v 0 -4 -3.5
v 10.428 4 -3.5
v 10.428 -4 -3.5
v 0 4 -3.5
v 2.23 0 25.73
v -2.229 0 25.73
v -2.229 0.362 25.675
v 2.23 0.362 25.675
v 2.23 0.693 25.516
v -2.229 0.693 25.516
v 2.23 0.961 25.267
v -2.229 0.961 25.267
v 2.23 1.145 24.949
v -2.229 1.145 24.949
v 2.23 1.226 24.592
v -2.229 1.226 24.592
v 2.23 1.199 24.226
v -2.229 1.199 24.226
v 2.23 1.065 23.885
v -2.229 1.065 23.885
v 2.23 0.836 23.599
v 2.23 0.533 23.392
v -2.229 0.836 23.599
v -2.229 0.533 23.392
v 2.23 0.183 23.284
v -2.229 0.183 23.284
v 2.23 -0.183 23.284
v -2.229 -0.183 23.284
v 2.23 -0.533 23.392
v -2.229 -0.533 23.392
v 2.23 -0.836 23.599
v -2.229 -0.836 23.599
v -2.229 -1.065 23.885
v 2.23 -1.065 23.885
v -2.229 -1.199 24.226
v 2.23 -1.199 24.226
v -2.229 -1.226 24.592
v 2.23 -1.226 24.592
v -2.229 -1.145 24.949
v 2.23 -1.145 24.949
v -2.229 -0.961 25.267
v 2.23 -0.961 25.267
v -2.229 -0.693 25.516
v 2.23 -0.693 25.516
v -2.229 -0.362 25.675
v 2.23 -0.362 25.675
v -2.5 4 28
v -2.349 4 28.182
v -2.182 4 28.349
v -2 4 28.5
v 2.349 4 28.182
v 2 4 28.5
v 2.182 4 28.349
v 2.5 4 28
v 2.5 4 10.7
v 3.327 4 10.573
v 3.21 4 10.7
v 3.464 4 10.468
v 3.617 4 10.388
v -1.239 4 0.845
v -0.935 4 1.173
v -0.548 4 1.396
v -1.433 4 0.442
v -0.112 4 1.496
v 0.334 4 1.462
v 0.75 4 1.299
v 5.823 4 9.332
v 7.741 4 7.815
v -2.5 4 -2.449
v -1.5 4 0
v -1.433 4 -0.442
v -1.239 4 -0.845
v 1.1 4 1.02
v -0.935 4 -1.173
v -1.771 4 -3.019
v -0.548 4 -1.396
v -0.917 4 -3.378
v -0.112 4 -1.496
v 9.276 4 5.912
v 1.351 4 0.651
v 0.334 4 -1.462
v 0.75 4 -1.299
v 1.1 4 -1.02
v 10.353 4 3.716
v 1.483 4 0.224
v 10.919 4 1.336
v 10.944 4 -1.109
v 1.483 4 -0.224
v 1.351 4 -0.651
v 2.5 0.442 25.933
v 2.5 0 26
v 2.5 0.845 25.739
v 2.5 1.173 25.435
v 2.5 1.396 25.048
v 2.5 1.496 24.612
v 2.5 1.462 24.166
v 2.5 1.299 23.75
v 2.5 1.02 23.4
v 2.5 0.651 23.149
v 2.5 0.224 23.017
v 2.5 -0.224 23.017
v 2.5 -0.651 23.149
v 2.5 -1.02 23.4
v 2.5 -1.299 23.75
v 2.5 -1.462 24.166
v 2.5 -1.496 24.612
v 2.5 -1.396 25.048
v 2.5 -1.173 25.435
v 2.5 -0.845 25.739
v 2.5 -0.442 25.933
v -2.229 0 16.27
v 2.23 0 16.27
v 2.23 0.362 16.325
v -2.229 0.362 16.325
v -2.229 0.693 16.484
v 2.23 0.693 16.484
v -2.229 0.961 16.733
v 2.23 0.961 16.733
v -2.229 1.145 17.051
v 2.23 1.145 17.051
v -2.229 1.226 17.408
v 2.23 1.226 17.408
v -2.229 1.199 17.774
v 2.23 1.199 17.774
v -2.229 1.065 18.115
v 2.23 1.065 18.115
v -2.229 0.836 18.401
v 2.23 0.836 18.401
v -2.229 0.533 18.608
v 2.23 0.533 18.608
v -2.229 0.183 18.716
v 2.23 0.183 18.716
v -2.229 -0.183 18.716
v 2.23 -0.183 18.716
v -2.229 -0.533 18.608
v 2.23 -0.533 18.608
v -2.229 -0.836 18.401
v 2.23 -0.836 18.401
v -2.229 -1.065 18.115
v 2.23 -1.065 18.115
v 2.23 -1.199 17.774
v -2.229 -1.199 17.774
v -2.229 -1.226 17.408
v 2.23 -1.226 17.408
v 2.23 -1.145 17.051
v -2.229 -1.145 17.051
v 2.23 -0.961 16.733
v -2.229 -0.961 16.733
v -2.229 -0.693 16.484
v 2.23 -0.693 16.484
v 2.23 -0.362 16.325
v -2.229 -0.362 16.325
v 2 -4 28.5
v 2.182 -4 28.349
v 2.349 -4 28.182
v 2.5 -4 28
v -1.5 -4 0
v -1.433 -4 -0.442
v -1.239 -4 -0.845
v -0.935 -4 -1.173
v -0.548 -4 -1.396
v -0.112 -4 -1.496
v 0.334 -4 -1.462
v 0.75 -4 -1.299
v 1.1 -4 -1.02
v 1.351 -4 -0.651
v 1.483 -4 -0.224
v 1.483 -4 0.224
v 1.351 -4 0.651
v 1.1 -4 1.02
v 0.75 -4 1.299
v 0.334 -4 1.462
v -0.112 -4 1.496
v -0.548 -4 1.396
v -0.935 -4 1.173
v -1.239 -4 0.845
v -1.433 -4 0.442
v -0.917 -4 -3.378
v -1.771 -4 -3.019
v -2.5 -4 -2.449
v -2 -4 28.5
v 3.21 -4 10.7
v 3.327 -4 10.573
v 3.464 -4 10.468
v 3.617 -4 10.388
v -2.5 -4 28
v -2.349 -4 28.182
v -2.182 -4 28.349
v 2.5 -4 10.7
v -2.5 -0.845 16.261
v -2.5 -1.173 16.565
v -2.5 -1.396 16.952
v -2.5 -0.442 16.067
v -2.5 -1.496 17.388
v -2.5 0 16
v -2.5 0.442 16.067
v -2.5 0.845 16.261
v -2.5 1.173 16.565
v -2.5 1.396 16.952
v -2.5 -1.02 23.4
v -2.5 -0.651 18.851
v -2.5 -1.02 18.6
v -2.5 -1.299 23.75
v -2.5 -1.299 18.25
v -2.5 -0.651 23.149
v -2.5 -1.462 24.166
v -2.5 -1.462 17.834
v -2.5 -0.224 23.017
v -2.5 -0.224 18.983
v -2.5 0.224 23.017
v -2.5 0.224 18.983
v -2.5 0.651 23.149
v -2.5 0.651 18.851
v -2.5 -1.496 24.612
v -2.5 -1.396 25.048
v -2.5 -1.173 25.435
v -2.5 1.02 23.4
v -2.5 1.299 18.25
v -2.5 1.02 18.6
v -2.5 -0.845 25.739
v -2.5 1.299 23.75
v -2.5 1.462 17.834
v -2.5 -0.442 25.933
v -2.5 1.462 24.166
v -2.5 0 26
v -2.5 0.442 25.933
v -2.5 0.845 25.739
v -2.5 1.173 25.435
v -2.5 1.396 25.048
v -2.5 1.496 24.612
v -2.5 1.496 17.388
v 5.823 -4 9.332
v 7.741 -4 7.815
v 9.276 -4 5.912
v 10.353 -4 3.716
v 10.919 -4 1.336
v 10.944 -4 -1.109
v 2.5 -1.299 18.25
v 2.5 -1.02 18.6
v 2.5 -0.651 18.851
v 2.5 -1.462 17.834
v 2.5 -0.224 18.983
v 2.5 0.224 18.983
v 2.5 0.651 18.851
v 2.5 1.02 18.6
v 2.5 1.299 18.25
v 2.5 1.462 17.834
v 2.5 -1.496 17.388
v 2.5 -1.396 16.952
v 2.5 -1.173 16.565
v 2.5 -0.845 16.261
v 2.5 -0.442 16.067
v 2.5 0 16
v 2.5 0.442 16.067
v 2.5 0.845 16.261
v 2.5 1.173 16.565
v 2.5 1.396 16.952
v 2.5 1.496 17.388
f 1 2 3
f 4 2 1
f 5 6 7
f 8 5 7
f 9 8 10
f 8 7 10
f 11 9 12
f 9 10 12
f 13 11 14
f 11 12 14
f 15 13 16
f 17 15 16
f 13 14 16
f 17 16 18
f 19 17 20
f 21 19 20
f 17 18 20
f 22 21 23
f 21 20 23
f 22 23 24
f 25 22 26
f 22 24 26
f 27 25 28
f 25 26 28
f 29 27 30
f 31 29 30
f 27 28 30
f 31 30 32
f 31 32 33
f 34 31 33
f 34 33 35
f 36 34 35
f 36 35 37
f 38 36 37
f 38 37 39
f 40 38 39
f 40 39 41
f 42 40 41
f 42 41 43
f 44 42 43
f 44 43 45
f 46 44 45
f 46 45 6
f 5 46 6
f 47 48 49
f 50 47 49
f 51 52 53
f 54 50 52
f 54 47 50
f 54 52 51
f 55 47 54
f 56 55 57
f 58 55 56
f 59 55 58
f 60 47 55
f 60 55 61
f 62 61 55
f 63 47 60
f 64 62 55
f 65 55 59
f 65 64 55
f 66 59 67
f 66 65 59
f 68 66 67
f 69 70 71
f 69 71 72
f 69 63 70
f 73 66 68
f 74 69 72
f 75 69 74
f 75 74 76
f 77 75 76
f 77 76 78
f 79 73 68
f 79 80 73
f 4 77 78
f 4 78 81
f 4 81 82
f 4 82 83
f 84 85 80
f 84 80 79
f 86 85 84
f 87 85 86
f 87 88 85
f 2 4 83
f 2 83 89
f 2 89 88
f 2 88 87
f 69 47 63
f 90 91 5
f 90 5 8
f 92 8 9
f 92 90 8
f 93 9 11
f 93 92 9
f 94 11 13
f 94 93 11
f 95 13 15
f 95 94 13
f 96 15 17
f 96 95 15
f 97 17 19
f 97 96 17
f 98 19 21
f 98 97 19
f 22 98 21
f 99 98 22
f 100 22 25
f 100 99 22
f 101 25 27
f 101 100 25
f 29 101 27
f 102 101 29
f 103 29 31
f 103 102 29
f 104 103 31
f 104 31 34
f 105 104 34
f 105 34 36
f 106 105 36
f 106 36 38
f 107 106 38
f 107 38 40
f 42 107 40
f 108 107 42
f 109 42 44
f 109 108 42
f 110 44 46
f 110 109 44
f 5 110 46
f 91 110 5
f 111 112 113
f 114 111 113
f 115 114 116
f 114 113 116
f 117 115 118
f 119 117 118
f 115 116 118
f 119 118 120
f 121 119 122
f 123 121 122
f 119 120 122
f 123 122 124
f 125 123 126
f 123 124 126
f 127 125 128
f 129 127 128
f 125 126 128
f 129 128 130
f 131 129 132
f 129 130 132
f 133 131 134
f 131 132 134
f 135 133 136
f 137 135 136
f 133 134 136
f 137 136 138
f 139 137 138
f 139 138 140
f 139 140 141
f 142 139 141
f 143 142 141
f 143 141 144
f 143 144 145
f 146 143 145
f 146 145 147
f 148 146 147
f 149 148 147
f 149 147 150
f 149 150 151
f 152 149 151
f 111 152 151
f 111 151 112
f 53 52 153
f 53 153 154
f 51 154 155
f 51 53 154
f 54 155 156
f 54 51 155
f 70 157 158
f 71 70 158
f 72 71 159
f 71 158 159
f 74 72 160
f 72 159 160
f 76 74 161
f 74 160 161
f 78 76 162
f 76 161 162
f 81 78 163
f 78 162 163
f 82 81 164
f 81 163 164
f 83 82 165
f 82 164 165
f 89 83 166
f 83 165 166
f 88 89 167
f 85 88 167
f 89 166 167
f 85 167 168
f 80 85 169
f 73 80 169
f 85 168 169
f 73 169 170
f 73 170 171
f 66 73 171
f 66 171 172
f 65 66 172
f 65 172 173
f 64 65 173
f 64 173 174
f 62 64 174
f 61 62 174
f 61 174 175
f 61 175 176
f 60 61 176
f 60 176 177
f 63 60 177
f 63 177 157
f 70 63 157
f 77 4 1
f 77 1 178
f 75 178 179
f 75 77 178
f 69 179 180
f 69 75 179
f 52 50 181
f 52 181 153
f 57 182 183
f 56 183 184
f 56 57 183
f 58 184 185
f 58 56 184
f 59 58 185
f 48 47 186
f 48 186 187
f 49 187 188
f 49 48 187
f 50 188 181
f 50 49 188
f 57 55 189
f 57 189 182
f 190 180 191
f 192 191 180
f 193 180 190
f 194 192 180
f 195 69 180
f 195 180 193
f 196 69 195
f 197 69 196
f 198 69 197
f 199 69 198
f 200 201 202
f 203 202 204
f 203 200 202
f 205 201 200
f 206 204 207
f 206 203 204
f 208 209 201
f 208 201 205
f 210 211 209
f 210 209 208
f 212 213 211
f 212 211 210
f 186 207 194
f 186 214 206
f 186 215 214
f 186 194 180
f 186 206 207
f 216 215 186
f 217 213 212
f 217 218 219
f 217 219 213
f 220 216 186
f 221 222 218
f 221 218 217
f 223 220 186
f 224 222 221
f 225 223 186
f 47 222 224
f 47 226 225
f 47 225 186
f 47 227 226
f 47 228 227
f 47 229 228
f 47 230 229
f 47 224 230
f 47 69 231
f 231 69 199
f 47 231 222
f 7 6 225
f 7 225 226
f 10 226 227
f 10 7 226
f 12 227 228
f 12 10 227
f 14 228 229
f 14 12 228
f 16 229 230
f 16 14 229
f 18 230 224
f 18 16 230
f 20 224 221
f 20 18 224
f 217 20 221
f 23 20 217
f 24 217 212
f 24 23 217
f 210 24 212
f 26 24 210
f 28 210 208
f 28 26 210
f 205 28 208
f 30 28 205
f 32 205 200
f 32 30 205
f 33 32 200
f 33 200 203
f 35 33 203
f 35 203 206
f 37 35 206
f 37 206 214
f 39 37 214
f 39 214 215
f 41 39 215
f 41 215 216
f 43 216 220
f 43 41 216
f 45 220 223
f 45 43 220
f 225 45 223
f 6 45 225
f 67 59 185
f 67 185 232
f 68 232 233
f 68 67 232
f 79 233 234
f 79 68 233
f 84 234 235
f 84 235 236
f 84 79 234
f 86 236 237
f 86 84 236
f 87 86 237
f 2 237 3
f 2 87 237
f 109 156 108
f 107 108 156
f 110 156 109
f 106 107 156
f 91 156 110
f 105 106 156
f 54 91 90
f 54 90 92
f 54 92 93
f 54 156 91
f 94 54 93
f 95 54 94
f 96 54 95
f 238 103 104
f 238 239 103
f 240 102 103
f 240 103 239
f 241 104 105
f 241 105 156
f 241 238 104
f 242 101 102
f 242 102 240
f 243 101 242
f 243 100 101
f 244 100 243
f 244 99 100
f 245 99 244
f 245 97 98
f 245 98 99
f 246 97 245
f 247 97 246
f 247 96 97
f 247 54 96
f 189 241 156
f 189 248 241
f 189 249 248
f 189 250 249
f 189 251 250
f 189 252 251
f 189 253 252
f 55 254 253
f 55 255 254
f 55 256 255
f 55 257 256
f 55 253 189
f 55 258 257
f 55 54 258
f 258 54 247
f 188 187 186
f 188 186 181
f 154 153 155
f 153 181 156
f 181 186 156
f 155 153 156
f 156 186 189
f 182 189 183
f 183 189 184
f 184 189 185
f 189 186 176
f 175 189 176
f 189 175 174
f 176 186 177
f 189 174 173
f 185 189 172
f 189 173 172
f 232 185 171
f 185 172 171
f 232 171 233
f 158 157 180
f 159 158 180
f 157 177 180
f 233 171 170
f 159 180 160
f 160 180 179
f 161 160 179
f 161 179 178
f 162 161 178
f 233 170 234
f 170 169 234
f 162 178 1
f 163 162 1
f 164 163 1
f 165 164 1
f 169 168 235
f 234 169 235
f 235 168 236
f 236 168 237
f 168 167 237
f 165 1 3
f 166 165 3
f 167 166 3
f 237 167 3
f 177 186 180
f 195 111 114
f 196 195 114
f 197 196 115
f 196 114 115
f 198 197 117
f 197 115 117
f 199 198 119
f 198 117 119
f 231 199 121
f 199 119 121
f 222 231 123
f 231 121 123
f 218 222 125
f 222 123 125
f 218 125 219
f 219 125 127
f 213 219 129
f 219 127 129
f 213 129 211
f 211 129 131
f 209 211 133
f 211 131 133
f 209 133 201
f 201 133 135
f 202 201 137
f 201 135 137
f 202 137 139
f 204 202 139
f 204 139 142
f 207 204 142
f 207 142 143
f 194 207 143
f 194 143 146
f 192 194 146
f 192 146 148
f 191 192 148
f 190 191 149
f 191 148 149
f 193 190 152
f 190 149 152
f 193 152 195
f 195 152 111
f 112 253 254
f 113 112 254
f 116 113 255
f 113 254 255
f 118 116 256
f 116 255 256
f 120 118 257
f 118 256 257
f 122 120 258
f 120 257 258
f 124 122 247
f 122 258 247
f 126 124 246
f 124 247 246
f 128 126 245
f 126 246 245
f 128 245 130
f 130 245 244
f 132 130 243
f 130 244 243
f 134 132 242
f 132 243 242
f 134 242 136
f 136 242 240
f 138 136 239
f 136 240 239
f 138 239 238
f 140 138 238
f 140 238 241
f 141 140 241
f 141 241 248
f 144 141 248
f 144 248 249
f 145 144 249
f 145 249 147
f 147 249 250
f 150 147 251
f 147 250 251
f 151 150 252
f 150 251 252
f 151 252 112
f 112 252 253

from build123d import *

# Parameters (mm, degrees)
EXTRUDE_1_DEPTH        = 8
HOLE_WIZARD_M2_1_D     = 2.459
HOLE_WIZARD_M2_1_DEPTH = 13.499999938
HOLE_WIZARD_M2_2_D     = 2.459
HOLE_WIZARD_3_0_3_1_D  = 3
CHAMFER_1_SIZE         = 0.2705


with BuildPart() as part:
    # 草图1 → 凸台-拉伸1 (new body)
    with BuildSketch(Plane(origin=(0, 4, 0), x_dir=(1, 0, 0), z_dir=(0, 1, 0))):
        with BuildLine():
            Line((-2.499999938, 2.449489682), (-2.499999938, -28.00000006))
            ThreePointArc((-2.499999938, -28.00000006), (-2.267766887, -28.267767018), (-1.999999928, -28.500000068))
            Line((-1.999999928, -28.500000068), (2.000000062, -28.500000068))
            ThreePointArc((2.000000062, -28.500000068), (2.267767019, -28.267767016), (2.500000069, -28.000000058))
            Line((2.500000069, -28.000000058), (2.500000069, -10.7))
            Line((2.500000069, -10.7), (3.21, -10.7))
            ThreePointArc((3.21, -10.7), (3.393052661, -10.517652269), (3.616779061, -10.388402631))
            ThreePointArc((3.616779061, -10.388402631), (9.876142021, -4.843740163), (10.428326836, 3.499999914))
            Line((10.428326836, 3.499999914), (0, 3.499999914))
            ThreePointArc((0, 3.499999914), (-1.355873467, 3.226702114), (-2.499999938, 2.449489682))
        make_face()
    extrude(amount=-EXTRUDE_1_DEPTH)

    # M2 间隙孔1
    with Locations(Plane.ZY.offset(2.499999938)):
        with Locations((17.5, 0)):
            Hole(HOLE_WIZARD_M2_1_D / 2, depth=HOLE_WIZARD_M2_1_DEPTH)

    # M2 间隙孔2 (through all)
    with Locations(Plane(origin=(2.500000069, 0, 0), x_dir=(0, 0, -1), z_dir=(1, 0, 0))):
        with Locations((-24.500000001, 0)):
            Hole(HOLE_WIZARD_M2_2_D / 2)

    # Ø3.0 (3) 直径孔1 (through all)
    with Locations(Plane(origin=(0, 4, 0), x_dir=(1, 0, 0), z_dir=(0, 1, 0))):
        with Locations((0, 0)):
            Hole(HOLE_WIZARD_3_0_3_1_D / 2)

    # 倒角1
    chamfer_1_edges = [part.edges().sort_by_distance(p)[0] for p in [
        (2.500000069, 0, 18.7295),
        (-2.499999938, 0, 18.7295),
        (2.500000069, 0, 23.270500001),
        (-2.499999938, 0, 23.270500001),
    ]]
    chamfer(chamfer_1_edges, length=CHAMFER_1_SIZE)


solid = part.part
